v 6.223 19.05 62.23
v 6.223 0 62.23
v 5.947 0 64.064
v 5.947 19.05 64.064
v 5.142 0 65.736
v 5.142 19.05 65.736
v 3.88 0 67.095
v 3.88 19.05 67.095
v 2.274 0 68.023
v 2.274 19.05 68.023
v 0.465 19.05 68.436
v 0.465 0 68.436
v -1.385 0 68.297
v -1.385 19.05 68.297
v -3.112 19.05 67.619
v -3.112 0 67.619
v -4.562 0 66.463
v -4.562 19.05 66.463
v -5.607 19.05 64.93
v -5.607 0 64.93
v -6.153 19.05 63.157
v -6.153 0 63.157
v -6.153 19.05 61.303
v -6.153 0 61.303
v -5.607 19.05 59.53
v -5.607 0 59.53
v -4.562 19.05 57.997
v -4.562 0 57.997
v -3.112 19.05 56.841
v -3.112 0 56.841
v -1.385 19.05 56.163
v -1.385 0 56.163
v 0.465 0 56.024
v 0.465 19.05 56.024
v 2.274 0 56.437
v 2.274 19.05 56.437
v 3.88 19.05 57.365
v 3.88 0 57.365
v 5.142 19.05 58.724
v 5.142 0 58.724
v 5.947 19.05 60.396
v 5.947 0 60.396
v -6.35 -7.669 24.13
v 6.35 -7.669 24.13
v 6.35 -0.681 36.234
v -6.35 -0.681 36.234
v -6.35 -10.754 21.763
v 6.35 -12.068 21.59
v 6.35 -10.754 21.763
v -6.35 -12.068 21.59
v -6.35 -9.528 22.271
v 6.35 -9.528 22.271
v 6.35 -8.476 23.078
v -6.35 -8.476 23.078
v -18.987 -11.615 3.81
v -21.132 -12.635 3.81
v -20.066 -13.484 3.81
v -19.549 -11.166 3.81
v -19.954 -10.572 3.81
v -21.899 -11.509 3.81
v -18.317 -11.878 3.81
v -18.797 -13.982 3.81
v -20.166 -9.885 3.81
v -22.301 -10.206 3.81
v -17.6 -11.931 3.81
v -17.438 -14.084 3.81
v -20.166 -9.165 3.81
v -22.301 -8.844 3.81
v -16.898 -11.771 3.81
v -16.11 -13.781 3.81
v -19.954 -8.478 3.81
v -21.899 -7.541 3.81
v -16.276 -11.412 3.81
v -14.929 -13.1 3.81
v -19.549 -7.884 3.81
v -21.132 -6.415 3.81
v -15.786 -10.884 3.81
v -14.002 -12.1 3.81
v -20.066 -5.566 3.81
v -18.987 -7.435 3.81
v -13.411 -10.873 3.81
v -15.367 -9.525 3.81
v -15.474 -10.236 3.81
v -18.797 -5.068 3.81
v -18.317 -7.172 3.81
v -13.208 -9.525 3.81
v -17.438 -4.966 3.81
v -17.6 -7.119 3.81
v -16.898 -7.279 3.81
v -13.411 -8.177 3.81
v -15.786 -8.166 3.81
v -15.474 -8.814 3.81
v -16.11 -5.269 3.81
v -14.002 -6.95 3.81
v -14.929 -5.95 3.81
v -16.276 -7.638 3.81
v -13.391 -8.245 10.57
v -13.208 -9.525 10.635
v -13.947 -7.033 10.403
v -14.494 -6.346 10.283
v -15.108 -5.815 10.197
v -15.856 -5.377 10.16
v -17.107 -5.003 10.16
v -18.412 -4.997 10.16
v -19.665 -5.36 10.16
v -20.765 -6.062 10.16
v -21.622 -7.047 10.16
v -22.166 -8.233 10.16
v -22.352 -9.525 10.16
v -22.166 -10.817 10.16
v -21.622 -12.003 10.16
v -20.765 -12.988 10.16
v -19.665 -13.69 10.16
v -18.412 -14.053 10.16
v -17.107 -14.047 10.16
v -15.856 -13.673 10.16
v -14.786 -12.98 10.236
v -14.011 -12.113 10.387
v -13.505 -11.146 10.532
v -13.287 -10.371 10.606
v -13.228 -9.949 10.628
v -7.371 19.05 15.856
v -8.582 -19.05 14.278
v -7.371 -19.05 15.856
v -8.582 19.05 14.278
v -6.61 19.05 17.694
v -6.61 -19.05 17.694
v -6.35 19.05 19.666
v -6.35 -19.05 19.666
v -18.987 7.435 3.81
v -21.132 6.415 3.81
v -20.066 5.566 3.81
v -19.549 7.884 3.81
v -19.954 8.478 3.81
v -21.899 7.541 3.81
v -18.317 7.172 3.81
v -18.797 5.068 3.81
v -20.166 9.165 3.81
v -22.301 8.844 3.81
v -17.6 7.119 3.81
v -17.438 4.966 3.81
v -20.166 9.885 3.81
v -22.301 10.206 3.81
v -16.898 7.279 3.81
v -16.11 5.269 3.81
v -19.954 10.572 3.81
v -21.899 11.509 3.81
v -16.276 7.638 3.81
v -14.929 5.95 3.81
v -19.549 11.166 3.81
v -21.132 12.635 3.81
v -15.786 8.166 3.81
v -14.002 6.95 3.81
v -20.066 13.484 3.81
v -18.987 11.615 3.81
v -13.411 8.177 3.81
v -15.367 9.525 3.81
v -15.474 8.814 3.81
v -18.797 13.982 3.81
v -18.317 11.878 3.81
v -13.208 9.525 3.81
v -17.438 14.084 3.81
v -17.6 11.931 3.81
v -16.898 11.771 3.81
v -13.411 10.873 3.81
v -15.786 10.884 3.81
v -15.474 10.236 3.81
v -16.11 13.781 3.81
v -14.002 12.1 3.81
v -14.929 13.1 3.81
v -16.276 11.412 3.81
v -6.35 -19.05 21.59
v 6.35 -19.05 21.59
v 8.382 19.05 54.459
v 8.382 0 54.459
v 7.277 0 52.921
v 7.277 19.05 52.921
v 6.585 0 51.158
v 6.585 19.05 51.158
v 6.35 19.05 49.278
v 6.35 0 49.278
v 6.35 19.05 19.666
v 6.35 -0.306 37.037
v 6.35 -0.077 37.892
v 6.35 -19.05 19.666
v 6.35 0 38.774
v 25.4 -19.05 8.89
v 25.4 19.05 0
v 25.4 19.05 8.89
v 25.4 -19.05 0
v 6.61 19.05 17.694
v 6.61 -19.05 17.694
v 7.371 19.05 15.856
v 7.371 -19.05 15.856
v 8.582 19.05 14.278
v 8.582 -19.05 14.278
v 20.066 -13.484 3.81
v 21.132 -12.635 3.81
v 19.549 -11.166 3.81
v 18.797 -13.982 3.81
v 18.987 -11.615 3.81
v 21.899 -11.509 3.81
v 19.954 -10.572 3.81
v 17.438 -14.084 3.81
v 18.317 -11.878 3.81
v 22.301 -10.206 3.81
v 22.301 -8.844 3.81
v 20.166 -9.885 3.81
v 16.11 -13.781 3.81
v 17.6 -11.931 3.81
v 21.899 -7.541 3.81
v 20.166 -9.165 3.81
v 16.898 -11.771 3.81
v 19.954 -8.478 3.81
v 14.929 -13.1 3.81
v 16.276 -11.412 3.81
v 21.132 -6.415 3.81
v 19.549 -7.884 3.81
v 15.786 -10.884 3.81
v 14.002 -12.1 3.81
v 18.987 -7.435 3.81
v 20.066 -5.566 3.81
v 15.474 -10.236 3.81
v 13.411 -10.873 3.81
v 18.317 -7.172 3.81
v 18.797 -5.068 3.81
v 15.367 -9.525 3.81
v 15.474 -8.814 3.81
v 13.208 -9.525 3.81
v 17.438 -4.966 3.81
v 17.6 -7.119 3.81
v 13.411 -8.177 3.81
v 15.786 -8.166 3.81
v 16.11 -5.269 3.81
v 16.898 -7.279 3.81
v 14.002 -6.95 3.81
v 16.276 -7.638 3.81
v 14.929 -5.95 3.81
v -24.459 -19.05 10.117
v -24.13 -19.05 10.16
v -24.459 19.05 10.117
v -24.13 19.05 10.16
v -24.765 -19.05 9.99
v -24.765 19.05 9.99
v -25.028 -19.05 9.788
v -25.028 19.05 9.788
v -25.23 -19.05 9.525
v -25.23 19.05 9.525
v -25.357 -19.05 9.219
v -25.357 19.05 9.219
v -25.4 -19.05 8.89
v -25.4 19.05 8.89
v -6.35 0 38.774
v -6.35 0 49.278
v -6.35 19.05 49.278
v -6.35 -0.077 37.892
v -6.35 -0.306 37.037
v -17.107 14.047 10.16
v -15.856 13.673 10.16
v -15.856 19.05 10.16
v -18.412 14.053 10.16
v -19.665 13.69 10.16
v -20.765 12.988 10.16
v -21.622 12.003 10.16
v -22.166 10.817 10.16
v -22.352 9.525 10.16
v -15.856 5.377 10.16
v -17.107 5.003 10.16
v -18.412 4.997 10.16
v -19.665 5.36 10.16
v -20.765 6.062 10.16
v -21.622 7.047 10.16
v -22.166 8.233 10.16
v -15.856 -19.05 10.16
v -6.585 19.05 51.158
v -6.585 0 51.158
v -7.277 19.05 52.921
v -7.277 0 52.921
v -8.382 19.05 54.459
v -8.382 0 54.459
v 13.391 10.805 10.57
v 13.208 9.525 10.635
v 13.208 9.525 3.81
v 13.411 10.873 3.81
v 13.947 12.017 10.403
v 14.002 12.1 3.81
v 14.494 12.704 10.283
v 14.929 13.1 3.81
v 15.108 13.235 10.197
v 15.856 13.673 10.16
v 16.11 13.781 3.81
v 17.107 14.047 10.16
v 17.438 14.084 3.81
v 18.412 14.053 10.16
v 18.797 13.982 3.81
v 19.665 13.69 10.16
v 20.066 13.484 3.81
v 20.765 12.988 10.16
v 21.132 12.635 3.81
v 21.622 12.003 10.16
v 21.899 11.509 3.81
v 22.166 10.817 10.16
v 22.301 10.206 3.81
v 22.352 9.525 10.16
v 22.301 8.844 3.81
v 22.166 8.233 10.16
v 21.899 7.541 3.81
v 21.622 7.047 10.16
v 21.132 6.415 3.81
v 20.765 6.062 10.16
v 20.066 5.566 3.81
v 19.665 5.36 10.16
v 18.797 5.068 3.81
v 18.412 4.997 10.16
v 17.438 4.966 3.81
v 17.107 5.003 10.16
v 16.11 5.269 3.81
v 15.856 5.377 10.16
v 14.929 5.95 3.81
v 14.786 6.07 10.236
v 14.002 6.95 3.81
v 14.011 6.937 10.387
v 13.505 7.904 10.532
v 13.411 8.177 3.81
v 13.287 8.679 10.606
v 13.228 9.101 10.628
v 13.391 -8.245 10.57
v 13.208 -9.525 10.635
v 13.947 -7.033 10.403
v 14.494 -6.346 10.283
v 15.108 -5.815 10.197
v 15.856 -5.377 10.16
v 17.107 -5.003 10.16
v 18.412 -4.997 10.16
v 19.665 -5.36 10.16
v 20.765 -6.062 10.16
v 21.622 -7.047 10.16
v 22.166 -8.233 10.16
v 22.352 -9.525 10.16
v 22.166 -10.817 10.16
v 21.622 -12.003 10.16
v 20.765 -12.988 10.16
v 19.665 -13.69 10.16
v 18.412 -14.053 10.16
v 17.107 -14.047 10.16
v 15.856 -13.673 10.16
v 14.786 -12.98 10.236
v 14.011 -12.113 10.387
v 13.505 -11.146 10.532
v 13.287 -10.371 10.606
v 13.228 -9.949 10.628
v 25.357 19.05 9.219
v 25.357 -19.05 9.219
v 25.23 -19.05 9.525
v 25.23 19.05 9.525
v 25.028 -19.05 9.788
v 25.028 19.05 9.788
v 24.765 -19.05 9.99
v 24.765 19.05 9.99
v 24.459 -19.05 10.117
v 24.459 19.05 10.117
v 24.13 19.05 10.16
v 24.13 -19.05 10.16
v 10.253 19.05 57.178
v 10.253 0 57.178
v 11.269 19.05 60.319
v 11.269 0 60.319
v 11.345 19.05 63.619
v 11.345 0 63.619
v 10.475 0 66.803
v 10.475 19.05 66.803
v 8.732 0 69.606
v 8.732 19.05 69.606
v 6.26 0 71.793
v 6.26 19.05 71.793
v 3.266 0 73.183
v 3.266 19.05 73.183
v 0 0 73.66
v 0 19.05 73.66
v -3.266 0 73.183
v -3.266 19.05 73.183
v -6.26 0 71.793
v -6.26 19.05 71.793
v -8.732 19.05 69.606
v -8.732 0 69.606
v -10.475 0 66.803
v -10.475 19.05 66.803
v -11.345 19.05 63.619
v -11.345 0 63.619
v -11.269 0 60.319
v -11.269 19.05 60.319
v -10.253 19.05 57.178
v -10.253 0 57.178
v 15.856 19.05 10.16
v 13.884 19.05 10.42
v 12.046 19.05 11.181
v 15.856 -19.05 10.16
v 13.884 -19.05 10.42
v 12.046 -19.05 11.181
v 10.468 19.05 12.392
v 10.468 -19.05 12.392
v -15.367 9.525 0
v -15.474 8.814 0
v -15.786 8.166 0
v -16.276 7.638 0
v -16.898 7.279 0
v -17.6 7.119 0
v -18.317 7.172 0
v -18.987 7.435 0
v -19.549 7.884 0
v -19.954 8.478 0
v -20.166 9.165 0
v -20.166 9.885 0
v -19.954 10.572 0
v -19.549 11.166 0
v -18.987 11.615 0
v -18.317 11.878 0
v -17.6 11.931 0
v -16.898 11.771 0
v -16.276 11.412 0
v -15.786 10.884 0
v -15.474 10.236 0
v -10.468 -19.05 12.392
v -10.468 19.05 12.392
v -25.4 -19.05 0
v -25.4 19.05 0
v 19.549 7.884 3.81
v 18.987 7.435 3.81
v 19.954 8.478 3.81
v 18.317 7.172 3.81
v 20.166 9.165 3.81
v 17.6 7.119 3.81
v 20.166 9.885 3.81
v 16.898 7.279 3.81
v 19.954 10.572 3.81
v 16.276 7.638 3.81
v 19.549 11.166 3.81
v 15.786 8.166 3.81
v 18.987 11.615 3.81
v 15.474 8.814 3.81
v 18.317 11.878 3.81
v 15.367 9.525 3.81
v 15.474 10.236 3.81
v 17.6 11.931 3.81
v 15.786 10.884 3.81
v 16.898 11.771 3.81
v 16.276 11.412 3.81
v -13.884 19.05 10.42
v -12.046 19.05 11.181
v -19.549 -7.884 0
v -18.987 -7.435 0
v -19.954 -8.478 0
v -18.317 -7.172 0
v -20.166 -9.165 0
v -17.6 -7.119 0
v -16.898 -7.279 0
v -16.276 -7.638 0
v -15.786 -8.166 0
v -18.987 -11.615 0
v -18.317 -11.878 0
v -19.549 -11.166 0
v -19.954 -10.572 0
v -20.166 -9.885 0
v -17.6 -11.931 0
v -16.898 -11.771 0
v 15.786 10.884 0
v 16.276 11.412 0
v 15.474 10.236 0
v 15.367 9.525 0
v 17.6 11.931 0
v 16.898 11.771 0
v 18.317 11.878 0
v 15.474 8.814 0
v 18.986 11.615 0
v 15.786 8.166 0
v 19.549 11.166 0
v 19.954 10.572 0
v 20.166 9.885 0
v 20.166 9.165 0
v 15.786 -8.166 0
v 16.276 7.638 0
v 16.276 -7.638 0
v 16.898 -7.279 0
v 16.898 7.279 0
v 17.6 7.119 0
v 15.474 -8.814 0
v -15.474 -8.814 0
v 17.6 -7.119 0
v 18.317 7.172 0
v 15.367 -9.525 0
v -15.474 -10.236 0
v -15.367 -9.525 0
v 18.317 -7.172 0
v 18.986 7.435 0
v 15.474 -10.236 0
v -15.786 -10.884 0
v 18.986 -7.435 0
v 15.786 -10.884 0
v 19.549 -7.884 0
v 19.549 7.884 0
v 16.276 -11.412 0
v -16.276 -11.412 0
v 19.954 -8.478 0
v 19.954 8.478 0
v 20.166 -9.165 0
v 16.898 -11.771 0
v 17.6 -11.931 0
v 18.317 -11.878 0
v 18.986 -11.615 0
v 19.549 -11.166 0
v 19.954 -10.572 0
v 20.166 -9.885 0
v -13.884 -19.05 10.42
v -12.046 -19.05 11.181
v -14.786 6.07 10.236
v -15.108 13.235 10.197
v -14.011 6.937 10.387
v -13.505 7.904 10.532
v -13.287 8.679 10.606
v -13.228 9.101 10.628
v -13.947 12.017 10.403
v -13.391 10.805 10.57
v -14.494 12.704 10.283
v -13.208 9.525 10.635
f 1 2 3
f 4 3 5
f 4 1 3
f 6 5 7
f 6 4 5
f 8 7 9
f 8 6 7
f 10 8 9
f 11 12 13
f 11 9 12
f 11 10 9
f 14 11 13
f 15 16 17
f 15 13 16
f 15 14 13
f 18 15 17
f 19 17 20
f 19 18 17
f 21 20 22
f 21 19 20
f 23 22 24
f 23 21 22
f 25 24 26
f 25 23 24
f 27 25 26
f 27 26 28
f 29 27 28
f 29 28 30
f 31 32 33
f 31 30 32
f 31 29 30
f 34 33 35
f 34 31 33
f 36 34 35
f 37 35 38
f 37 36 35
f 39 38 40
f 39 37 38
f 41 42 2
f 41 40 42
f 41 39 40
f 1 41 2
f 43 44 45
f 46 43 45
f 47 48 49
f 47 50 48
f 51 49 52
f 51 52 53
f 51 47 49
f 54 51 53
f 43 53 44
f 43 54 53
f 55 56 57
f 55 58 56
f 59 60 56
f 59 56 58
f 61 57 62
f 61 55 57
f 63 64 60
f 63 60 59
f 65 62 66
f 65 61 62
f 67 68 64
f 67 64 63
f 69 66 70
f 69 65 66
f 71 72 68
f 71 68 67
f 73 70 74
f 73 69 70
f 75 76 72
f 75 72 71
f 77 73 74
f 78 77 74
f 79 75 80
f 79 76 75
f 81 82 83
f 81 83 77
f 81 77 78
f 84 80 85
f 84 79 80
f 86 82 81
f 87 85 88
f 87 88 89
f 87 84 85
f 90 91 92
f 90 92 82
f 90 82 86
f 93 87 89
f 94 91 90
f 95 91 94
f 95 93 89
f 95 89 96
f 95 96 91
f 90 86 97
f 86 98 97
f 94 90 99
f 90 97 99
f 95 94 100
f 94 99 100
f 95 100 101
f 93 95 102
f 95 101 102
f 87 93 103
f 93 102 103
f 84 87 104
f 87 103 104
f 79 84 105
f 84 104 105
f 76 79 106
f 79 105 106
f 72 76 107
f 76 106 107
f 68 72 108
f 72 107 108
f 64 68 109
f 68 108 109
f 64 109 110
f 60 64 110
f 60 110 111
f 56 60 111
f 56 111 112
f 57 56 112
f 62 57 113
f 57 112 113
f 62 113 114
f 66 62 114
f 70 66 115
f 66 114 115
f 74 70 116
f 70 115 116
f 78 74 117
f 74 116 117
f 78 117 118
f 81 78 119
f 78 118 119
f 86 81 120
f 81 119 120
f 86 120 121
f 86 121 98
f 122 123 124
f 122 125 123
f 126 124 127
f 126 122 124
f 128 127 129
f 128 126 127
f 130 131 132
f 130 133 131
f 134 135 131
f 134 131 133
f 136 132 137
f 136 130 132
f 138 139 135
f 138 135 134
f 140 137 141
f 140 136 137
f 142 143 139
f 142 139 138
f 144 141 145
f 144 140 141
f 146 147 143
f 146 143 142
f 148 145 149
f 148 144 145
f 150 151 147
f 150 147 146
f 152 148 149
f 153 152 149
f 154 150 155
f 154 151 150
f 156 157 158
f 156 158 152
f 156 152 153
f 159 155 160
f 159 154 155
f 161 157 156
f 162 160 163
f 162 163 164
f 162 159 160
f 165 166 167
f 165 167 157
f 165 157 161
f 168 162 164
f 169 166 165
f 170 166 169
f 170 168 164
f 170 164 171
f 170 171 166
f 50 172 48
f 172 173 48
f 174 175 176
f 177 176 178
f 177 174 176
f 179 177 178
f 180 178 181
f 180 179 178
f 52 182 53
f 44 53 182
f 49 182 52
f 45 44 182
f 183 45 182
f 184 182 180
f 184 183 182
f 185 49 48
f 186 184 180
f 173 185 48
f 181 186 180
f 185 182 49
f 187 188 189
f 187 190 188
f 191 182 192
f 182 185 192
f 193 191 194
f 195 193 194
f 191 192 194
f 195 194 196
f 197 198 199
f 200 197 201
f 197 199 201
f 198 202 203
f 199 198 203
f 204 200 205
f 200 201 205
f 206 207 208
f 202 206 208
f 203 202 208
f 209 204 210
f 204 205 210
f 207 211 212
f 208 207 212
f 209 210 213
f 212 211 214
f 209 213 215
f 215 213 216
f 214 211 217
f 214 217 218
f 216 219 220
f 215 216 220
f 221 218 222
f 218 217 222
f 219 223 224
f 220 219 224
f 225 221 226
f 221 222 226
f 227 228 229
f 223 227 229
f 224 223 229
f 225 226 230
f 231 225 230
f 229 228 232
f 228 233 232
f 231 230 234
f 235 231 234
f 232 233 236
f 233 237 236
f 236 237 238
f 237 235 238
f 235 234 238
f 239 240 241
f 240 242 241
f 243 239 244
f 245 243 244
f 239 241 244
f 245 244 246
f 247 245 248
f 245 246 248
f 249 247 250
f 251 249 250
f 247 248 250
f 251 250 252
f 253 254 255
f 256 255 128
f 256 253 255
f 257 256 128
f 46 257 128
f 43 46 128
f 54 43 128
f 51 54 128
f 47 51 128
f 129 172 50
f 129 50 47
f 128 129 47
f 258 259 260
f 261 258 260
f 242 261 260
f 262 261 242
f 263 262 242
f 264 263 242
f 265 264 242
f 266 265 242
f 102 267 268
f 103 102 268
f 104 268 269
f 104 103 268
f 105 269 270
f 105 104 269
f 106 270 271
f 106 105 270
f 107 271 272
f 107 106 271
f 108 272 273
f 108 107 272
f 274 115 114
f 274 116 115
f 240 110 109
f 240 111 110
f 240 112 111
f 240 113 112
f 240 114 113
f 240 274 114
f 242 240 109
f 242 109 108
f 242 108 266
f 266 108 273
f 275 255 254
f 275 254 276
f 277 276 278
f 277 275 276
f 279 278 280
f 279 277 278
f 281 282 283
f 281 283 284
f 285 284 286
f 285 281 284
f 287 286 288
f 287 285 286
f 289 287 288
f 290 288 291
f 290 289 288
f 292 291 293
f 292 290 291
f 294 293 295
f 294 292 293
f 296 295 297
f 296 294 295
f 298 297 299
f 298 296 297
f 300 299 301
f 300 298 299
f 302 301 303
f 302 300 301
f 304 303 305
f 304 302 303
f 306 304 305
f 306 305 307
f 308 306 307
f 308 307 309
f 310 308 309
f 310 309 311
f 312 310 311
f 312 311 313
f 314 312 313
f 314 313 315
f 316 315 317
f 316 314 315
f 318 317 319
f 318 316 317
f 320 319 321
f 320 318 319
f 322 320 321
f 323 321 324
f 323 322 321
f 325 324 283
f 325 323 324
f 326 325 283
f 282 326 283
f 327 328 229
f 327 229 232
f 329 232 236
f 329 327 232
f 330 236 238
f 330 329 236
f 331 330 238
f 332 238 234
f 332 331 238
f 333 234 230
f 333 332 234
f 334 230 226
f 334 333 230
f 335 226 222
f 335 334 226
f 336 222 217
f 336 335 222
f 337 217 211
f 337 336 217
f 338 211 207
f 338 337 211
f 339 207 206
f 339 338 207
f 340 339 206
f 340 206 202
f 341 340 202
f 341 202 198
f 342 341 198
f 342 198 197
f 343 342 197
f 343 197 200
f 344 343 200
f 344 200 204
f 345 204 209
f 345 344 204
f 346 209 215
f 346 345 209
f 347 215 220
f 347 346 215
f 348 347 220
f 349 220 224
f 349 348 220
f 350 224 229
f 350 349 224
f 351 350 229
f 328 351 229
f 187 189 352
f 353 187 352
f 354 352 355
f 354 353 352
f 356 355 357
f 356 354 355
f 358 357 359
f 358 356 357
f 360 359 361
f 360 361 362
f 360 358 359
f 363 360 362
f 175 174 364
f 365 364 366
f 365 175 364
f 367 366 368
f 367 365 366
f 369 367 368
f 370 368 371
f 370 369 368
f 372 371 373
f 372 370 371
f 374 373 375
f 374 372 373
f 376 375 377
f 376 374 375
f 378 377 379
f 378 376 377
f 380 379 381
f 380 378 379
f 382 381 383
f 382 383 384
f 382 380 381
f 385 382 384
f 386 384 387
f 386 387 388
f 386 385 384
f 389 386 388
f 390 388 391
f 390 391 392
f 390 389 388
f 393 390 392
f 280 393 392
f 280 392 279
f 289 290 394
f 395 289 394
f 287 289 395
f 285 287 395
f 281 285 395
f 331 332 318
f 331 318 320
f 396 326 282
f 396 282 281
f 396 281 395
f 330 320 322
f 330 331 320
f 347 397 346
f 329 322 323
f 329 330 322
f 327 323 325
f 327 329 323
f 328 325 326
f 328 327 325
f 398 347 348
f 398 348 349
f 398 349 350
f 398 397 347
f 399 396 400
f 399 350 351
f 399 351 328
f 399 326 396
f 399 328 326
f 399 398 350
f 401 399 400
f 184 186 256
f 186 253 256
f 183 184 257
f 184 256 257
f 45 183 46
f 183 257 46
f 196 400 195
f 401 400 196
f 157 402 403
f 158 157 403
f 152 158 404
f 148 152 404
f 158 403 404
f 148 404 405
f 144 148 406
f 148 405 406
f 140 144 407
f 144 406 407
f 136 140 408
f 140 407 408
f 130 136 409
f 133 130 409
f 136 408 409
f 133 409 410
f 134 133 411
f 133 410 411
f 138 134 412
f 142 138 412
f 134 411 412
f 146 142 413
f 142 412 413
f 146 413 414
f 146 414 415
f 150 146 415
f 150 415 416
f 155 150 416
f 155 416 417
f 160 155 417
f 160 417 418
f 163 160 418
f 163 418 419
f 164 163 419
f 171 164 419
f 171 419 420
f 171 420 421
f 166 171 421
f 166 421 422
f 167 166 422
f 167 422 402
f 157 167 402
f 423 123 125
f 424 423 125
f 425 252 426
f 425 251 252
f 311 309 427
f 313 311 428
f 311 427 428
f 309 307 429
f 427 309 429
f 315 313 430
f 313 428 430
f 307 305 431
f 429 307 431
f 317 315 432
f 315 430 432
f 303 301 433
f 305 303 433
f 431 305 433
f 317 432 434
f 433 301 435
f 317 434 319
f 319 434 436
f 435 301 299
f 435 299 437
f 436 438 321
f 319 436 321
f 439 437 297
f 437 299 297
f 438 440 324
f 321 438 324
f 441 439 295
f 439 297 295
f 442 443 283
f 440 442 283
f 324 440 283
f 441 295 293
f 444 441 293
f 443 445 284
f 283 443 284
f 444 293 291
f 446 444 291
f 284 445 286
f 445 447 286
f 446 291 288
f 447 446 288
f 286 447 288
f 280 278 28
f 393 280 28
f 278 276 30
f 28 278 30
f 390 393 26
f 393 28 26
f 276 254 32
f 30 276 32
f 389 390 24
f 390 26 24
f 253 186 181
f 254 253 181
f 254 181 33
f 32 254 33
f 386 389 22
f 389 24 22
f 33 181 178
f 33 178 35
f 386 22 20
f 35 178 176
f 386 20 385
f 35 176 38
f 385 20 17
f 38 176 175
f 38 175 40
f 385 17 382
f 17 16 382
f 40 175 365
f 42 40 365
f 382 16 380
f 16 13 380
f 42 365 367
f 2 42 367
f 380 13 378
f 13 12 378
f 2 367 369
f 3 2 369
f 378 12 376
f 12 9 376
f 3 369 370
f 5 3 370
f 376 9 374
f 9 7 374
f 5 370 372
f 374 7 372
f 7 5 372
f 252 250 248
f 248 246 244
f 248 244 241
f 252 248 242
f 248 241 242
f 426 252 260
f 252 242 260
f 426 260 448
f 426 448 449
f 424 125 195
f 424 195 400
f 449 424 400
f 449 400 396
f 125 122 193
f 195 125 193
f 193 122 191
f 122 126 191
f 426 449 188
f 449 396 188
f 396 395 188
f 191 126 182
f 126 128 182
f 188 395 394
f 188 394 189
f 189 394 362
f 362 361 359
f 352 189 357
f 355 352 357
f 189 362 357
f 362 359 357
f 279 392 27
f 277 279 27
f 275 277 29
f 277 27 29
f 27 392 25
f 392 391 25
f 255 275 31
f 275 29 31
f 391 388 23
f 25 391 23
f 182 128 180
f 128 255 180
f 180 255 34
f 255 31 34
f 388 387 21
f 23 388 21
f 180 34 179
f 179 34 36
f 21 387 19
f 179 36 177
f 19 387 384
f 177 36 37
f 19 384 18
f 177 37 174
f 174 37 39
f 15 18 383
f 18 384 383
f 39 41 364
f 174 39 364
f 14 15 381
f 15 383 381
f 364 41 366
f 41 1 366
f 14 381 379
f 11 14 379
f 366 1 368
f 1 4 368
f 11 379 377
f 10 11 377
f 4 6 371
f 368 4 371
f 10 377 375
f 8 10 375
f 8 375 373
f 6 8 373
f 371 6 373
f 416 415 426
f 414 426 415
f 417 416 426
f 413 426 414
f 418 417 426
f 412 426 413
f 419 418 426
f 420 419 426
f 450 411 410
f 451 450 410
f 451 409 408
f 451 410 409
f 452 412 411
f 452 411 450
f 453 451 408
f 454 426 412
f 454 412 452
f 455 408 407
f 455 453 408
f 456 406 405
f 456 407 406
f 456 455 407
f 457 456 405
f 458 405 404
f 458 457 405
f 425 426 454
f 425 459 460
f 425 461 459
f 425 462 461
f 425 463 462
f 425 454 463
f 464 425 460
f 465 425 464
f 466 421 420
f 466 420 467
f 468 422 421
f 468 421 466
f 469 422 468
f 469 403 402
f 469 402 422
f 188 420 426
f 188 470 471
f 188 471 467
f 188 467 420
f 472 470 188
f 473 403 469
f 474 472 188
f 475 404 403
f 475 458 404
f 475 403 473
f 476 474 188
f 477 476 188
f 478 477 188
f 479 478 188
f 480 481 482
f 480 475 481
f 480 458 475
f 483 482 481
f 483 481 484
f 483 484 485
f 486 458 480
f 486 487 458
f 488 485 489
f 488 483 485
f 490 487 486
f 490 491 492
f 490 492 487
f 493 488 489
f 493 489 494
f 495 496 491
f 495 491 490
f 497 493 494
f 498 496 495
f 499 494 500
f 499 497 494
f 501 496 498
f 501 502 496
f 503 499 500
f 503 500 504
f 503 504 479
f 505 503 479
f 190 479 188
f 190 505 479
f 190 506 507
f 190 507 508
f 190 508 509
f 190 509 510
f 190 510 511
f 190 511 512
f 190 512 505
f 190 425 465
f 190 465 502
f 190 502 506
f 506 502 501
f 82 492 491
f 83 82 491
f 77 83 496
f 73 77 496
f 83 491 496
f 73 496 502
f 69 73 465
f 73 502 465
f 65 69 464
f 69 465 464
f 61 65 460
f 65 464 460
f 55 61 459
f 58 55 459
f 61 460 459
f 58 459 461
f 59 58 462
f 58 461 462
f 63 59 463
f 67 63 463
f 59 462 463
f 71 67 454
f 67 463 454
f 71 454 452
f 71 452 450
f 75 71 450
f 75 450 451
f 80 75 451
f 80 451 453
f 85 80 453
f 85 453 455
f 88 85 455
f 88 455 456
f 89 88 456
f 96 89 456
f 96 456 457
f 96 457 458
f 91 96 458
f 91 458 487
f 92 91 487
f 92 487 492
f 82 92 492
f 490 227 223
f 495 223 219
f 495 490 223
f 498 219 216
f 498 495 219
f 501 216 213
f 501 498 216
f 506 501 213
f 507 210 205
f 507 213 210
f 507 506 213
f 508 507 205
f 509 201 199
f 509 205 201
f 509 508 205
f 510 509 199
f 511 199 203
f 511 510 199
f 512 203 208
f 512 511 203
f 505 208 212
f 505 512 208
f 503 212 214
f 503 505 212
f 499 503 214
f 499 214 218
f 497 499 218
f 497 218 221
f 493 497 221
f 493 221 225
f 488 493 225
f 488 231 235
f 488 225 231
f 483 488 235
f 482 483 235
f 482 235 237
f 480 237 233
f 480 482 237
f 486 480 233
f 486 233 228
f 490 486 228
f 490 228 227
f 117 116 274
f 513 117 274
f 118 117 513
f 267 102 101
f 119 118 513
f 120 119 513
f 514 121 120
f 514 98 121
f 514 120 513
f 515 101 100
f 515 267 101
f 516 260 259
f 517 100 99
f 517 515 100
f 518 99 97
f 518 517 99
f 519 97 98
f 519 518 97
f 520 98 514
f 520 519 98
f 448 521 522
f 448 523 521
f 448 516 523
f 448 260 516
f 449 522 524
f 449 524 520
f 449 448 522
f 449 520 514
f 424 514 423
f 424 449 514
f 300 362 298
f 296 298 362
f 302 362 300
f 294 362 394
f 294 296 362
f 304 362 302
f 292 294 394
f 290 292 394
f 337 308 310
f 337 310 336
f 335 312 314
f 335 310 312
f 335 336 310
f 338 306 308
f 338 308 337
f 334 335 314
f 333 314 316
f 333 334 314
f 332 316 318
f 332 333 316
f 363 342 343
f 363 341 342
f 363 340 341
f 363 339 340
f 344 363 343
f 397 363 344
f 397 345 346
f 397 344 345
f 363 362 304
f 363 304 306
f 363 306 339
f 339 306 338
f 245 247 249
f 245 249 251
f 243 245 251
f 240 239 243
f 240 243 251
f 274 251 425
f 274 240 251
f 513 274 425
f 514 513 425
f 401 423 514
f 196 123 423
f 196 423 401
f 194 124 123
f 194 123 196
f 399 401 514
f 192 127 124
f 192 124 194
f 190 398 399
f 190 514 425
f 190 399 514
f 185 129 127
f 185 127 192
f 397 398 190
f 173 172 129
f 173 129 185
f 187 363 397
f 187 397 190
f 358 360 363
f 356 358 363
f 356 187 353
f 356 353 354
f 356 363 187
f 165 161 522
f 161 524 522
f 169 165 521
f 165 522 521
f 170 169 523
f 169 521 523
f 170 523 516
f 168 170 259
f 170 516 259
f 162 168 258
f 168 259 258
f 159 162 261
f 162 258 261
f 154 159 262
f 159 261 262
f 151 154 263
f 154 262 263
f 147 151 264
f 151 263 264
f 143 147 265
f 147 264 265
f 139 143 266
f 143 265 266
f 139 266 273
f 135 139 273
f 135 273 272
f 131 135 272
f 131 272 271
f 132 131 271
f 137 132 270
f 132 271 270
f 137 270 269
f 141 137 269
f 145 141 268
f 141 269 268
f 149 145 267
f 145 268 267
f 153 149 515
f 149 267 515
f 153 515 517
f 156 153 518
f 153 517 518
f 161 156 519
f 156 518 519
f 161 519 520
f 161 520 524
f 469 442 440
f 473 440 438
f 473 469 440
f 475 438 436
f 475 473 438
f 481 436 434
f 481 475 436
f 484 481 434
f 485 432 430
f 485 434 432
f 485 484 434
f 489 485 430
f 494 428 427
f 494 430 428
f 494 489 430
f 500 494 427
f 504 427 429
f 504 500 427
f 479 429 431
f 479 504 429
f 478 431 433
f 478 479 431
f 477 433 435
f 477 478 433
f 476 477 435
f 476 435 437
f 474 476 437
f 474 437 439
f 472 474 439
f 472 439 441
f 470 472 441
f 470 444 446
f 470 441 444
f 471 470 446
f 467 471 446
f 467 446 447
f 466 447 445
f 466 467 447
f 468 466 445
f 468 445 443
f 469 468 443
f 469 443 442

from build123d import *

# Parameters (mm, degrees)
F0_R          = 6.223
F1_DEPTH      = 19.05
F2_SIZE       = 6.35
F4_R          = 7.62
F3_R          = 2.413
F5_DEPTH      = 73.661
F6_R          = 4.572
F7_DEPTH      = 6.35
F7_DEPTH_BACK = 63.501
F8_R          = 1.27
F10_DEPTH     = 25.4
F11_R         = 5.08


# Not quite as in the source:
# - a pattern or mirror of a feature is missing from the dataset's text; its kind, count and spacing are read off the source's solid


with BuildPart() as f1:
    # F0 (on Front) → F1 (new body, symmetric)
    with BuildSketch(Plane.XZ):
        with BuildLine():
            Line((-25.4, 10.16), (-25.4, 0))
            Line((-25.4, 0), (25.4, 0))
            Line((25.4, 0), (25.4, 10.16))
            Line((25.4, 10.16), (6.35, 10.16))
            Line((6.35, 10.16), (6.35, 52.7261902376))
            ThreePointArc((6.35, 52.7261902376), (0, 73.66), (-6.35, 52.7261902376))
            Line((-6.35, 52.7261902376), (-6.35, 10.16))
            Line((-6.35, 10.16), (-25.4, 10.16))
        make_face()
        with Locations((0, 62.23)):
            Circle(F0_R, mode=Mode.SUBTRACT)
    extrude(amount=F1_DEPTH, both=True)

    # F2
    f2_edges = [f1.edges().sort_by_distance(p)[0] for p in [
        (-6.35, 0, 10.16),
        (6.35, 0, 10.16),
    ]]
    chamfer(f2_edges, length=F2_SIZE)

    # F4
    f4_edges = [f1.edges().sort_by_distance(p)[0] for p in [
        (-6.35, 0, 52.72619),
        (-6.35, 0, 16.51),
        (-12.7, 0, 10.16),
        (12.7, 0, 10.16),
        (6.35, 0, 16.51),
        (6.35, 0, 52.72619),
    ]]
    fillet(f4_edges, radius=F4_R)

    # F3 (on face) → F5 (cut, through all)
    with BuildSketch(Plane(origin=(0, 0, 0), x_dir=(1, 0, 0), z_dir=(0, 0, -1))):
        with Locations((-17.78, 9.525)):
            Circle(F3_R)
        with Locations((-17.78, -9.525)):
            Circle(F3_R)
    f5 = extrude(amount=-F5_DEPTH, mode=Mode.SUBTRACT)

    # F5_copies: F5 across plane
    add(f5.mirror(Plane(origin=(0, 0, 0), x_dir=(0, 0, 1), z_dir=(1, 0, 0))), mode=Mode.SUBTRACT)

    # F6 (on face) → F7 (cut, two sides)
    with BuildSketch(Plane.XY.offset(10.16)) as f7_sk:
        with Locations((-17.78, 9.525)):
            Circle(F6_R)
        with Locations((-17.78, -9.525)):
            Circle(F6_R)
    f7 = extrude(amount=-F7_DEPTH, mode=Mode.SUBTRACT) + extrude(f7_sk.sketch, amount=F7_DEPTH_BACK, mode=Mode.SUBTRACT)

    # F7_copies: F7 across plane
    add(f7.mirror(Plane(origin=(2e-06, 0, 0), x_dir=(0, 0, 1), z_dir=(1, 0, 0))), mode=Mode.SUBTRACT)

    # F8
    f8_edges = [f1.edges().sort_by_distance(p)[0] for p in [
        (-25.4, 0, 10.16),
        (25.4, 0, 10.16),
    ]]
    fillet(f8_edges, radius=F8_R)

    # F9 (on Right) → F10 (cut, symmetric)
    with BuildSketch(Plane.YZ):
        Polygon((0, 37.4132022262), (0, 76.8906995654), (-23.6530974507, 76.8906995654), (-23.6530974507, 21.59), (-9.1355300647, 21.59), align=None)
    extrude(amount=F10_DEPTH, both=True, mode=Mode.SUBTRACT)

    # F11
    f11_edges = [f1.edges().sort_by_distance(p)[0] for p in [
        (0, 0, 37.413202),
        (0, -9.13553, 21.59),
    ]]
    fillet(f11_edges, radius=F11_R)


solid = f1.part
